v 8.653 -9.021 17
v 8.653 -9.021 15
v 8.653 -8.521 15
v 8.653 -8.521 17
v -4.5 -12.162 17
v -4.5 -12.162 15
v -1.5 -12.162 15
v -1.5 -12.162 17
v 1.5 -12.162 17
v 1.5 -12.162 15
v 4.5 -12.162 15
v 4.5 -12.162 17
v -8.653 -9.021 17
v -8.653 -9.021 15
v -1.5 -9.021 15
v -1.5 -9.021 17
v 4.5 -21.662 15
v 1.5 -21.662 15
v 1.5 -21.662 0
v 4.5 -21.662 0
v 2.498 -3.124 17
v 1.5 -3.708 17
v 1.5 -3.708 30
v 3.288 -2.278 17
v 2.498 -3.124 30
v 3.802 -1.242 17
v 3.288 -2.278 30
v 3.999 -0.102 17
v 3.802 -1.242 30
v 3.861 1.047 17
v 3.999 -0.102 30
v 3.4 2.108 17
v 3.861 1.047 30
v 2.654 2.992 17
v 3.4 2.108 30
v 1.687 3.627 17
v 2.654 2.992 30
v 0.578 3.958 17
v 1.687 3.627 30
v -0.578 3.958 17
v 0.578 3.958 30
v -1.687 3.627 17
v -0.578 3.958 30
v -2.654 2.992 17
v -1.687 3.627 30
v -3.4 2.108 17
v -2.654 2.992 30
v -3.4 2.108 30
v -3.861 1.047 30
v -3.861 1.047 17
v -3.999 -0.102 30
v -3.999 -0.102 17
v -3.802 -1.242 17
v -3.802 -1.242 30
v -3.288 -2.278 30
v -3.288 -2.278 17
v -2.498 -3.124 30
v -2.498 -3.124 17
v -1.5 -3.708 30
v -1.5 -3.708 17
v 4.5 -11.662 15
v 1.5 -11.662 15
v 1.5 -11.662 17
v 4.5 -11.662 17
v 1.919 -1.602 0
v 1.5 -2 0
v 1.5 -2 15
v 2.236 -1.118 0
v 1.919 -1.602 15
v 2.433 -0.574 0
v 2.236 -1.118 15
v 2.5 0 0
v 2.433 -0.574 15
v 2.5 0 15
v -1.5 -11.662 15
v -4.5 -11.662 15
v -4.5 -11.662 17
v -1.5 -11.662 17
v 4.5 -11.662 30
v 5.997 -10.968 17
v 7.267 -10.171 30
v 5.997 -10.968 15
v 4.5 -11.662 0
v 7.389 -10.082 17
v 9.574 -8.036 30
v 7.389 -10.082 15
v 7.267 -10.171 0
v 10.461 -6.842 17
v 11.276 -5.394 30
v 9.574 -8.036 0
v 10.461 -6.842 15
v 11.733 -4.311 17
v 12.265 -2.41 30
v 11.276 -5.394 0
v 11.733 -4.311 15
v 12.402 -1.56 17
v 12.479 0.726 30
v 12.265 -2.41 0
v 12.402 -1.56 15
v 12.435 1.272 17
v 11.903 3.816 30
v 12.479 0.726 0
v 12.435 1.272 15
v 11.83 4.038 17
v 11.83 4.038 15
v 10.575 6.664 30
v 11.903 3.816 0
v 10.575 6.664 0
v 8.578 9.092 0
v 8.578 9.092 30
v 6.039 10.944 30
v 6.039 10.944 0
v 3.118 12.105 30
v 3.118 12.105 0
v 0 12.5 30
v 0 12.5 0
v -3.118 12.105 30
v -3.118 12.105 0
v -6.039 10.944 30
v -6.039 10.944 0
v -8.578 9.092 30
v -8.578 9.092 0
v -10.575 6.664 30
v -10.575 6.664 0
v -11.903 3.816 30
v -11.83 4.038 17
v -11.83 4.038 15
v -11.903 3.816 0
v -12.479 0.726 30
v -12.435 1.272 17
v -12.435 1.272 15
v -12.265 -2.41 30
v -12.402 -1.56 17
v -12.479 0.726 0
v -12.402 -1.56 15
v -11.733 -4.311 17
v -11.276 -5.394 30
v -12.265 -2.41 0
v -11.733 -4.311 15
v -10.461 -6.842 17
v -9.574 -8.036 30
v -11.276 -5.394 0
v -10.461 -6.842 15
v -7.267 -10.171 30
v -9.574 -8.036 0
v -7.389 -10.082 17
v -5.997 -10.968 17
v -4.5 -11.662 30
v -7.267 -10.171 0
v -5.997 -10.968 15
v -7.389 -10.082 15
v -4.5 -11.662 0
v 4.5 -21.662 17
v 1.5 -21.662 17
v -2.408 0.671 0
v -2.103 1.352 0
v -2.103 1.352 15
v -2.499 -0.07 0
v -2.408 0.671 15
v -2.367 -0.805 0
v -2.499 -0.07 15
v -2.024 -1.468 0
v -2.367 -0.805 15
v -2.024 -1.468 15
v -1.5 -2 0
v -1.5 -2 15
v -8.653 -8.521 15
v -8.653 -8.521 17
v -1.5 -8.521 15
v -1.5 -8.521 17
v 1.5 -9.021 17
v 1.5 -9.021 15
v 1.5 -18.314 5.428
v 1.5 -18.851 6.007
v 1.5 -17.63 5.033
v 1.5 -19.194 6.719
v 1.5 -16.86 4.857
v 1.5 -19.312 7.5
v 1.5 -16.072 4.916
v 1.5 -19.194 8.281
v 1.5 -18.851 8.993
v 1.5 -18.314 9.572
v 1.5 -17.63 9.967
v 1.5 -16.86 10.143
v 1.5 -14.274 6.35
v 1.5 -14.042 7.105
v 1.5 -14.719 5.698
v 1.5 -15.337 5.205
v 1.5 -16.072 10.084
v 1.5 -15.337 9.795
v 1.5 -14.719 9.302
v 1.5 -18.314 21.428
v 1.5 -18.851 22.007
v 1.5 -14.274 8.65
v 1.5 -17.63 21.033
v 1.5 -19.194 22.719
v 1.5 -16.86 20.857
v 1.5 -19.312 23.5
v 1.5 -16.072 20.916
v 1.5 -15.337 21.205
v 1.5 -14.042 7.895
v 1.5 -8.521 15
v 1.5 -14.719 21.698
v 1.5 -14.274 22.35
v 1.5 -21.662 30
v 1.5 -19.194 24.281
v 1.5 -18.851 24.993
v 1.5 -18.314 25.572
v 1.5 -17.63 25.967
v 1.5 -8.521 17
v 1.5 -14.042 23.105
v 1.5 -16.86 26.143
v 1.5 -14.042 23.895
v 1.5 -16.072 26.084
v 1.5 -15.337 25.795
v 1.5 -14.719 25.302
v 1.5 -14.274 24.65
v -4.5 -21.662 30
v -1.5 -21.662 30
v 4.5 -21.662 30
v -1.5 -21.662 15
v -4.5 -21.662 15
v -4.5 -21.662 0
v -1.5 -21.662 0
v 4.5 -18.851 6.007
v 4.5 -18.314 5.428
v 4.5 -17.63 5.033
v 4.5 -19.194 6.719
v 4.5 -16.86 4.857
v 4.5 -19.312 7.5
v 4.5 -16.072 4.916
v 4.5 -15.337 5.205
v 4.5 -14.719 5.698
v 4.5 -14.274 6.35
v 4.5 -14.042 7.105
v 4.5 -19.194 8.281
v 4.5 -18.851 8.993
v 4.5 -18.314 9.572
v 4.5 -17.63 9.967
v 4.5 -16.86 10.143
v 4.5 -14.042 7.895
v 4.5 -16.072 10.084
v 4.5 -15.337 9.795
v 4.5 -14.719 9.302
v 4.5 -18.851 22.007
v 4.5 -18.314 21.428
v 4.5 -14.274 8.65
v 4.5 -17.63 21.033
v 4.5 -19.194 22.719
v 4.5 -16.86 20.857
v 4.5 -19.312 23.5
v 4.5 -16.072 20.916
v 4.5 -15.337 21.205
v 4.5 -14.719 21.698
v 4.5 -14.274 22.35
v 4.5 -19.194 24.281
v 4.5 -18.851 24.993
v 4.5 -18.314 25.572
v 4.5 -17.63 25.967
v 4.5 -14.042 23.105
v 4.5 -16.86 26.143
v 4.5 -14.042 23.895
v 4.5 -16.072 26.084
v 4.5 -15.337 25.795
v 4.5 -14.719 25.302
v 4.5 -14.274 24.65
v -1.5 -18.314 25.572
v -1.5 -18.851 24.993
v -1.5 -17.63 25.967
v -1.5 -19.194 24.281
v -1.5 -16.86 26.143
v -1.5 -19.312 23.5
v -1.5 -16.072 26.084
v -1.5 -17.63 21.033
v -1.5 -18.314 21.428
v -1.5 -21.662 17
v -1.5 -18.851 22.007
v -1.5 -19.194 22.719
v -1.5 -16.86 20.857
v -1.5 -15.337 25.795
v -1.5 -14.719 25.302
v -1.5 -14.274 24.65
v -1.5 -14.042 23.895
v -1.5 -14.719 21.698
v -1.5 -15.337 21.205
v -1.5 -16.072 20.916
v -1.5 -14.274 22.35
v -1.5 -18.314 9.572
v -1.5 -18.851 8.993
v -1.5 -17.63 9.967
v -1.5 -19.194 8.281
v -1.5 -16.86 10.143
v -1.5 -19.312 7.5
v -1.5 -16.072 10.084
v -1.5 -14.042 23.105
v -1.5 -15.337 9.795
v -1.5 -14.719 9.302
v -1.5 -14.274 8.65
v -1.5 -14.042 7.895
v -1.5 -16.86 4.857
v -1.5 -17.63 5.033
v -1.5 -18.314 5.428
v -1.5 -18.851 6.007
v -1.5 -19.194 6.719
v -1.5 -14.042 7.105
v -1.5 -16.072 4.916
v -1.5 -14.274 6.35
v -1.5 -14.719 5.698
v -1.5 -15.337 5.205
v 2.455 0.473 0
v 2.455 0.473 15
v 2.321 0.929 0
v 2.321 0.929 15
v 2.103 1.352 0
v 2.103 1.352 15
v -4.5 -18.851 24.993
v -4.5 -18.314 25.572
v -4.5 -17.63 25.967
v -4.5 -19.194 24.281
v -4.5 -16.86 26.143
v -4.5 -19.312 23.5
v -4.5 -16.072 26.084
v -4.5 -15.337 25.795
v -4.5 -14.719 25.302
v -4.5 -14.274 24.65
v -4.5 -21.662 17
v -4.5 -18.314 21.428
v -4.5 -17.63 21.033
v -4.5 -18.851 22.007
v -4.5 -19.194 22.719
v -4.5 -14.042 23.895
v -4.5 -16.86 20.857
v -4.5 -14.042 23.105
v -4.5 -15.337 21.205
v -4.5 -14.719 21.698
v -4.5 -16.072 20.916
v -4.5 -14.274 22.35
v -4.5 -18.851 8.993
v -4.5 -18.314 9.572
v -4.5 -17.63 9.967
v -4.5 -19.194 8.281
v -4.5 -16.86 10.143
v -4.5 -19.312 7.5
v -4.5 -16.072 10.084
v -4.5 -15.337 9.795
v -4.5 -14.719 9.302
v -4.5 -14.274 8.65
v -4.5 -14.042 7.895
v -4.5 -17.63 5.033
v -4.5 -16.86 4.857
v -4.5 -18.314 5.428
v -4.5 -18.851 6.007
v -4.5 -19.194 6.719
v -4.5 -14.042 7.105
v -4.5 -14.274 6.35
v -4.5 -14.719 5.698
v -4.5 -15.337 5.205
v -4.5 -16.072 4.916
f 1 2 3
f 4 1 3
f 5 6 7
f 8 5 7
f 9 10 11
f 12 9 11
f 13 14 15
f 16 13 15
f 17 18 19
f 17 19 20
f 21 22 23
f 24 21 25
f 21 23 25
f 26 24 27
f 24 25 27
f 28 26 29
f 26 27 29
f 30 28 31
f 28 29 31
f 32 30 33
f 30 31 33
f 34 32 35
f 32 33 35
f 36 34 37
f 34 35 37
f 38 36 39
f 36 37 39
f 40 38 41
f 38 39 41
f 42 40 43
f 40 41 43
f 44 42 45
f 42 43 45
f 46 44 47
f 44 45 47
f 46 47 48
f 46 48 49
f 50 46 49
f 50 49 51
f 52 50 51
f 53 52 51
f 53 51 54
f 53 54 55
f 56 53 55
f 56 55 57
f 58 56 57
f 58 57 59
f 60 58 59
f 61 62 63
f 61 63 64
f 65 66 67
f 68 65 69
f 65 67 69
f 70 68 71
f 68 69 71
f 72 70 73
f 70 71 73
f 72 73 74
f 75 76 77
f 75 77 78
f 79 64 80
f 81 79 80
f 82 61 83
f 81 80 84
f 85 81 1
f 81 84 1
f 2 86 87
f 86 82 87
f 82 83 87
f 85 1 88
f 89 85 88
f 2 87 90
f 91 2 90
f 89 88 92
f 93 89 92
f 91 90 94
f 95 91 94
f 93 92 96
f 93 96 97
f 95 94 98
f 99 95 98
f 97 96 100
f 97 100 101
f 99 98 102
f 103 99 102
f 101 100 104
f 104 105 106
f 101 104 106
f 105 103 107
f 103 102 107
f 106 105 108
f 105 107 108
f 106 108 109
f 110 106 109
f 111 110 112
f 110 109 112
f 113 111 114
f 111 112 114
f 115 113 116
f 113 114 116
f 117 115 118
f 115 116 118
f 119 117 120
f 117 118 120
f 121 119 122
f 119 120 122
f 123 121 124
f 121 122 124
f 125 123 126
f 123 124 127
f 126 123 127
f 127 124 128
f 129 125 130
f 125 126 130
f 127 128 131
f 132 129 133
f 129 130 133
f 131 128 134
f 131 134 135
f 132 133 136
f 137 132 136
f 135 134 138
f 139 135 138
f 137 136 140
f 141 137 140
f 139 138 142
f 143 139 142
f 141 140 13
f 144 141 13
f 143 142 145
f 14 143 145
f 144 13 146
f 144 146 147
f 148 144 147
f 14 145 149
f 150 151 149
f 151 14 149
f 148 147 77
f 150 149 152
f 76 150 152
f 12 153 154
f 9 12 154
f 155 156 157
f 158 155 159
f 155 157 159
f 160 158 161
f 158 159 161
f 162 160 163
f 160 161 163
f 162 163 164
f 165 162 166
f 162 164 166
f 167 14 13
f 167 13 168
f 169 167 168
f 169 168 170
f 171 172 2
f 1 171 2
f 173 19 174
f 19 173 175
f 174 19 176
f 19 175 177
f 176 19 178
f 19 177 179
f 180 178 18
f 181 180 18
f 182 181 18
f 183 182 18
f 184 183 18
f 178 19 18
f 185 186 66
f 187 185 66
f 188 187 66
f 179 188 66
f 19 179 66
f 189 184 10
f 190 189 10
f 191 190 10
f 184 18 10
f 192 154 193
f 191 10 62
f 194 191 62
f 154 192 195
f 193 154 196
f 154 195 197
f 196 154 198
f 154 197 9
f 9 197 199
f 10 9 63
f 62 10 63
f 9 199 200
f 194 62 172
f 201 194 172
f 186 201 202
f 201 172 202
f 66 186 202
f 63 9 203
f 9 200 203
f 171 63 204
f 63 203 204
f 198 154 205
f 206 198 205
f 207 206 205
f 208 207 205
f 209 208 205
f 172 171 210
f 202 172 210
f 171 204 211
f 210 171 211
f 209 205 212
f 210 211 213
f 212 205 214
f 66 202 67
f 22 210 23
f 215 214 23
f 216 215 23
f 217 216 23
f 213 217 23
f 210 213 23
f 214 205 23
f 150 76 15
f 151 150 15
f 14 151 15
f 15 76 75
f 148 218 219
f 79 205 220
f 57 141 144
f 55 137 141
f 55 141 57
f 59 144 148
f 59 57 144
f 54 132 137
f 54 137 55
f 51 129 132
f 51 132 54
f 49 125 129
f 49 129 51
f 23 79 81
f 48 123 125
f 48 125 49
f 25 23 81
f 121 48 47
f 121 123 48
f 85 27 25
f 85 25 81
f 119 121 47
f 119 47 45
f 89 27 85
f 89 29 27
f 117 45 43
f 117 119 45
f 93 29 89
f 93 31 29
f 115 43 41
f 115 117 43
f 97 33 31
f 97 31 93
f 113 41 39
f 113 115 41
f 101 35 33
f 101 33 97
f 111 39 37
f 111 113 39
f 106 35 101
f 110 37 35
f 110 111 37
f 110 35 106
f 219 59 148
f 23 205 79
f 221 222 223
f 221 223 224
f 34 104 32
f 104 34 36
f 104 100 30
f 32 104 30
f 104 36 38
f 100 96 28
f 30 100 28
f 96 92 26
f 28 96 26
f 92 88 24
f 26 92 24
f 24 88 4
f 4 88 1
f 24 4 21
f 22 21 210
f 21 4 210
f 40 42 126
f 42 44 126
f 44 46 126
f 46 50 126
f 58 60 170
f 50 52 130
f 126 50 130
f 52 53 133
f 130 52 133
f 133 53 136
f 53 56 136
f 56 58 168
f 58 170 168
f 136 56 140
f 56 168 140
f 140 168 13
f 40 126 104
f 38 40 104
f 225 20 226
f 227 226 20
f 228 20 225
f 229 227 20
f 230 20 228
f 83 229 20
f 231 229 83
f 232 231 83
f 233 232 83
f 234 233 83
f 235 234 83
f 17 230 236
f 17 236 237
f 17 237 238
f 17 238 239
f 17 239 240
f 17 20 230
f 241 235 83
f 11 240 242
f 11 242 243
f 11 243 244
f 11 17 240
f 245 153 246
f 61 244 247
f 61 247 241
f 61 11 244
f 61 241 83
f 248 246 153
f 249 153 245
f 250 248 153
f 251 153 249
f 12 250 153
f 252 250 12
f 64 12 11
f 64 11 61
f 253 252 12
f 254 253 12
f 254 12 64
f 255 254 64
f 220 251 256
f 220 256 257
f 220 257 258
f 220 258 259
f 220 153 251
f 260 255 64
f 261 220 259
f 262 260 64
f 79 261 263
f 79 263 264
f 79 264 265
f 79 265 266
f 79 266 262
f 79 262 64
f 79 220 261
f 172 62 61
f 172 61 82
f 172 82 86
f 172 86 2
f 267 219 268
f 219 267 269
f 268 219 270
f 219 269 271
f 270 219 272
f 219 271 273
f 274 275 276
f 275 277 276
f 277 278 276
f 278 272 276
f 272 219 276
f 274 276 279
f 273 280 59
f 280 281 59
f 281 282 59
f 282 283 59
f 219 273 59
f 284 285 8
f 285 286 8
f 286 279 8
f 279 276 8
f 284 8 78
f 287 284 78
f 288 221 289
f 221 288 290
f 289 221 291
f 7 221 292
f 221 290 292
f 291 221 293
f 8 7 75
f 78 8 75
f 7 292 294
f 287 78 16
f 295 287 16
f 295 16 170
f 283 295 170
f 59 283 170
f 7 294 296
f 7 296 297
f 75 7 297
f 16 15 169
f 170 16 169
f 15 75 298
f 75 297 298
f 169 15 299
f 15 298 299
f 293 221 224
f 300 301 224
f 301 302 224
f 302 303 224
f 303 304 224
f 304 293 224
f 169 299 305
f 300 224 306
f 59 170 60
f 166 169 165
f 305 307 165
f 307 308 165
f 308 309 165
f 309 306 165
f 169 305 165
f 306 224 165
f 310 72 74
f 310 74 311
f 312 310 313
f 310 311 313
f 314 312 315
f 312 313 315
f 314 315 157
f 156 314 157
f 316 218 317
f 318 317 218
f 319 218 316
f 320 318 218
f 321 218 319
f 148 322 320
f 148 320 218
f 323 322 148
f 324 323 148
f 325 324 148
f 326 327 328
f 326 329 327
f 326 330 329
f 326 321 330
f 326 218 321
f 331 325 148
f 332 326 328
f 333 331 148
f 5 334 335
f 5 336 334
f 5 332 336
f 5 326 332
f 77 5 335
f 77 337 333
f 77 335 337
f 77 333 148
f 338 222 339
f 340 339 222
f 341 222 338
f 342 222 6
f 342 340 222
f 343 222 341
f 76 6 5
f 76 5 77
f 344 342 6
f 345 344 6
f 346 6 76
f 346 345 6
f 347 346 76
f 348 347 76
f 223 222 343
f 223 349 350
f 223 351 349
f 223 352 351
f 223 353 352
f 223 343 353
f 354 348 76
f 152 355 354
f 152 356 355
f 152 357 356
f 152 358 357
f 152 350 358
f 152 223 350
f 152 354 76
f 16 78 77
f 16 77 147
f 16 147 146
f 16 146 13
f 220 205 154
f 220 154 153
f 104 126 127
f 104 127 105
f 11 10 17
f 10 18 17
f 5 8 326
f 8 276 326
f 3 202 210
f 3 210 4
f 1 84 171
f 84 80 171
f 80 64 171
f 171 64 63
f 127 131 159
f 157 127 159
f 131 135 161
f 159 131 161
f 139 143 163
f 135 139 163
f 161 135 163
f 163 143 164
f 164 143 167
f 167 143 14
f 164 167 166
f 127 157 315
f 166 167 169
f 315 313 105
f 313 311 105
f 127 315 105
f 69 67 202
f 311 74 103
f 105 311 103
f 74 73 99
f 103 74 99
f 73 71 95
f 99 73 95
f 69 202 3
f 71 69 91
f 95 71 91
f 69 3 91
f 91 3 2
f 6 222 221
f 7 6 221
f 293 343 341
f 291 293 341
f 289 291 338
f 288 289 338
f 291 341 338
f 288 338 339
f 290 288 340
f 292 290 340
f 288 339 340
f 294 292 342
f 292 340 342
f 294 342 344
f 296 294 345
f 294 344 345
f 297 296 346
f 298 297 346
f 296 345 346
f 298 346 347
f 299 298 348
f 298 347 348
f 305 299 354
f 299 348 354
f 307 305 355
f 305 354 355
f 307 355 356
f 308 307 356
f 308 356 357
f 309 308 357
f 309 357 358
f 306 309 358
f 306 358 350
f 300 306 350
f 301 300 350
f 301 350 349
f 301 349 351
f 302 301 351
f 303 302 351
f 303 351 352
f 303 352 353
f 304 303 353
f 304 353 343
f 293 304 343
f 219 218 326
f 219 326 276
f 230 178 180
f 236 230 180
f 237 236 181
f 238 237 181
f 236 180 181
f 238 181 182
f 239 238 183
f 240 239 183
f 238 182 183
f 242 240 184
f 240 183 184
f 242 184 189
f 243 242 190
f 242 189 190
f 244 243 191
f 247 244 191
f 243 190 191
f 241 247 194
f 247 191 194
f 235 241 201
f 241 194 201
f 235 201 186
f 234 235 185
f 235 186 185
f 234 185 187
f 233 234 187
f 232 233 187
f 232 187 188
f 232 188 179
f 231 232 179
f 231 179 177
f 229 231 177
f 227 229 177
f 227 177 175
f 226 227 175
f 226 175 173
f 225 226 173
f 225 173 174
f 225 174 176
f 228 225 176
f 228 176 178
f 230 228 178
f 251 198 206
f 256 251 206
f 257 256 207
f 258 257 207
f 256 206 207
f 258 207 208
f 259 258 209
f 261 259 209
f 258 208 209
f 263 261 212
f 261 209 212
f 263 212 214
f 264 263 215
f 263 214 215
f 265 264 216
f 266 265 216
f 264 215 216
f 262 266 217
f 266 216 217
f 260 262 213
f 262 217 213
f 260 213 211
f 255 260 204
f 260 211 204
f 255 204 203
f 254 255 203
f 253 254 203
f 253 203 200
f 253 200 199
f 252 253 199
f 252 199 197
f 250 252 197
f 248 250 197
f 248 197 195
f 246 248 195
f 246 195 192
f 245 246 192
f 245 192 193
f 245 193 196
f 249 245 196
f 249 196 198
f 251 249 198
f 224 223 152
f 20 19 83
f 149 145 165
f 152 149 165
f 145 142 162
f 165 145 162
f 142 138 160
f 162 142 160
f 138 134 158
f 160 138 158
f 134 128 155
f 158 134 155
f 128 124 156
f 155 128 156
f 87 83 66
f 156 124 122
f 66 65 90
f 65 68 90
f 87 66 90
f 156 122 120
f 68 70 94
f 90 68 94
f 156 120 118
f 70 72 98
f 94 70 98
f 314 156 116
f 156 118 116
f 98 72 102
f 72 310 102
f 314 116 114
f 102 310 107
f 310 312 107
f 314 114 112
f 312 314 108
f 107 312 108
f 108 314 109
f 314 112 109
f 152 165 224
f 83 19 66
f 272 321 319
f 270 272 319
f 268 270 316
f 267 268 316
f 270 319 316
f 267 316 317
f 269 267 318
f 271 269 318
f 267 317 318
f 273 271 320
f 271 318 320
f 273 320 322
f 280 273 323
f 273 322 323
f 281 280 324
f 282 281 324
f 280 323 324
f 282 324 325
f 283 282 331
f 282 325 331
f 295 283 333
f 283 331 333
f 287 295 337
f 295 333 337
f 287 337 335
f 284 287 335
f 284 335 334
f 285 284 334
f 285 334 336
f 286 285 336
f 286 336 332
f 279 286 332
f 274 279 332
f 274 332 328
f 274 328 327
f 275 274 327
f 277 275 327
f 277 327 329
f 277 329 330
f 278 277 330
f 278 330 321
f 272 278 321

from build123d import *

# Parameters (mm, degrees)
F0_R      = 12.5
F1_DEPTH  = 30
F3_DEPTH  = 30.001
F4_R      = 4
F5_DEPTH  = 15
F6_W      = 3
F6_H      = 12.5
F7_DEPTH  = 30.001
F9_DEPTH  = 30
F10_W     = 20.1029244214
F10_H     = 2
F10_W_2   = 3
F10_W_3   = 20.1884878725
F11_DEPTH = 25.7
F12_R     = 2.65
F13_DEPTH = 17.001
F14_W     = 3
F14_H     = 0.5
F15_DEPTH = 2
F16_W     = 7.1528945421
F16_H     = 0.5
F17_DEPTH = 2


with BuildPart() as f1:
    # F0 (on Top) → F1 (new body)
    with BuildSketch(Plane.XY):
        Circle(F0_R)
    extrude(amount=F1_DEPTH)

    # F2 (on face) → F3 (cut, through all)
    with BuildSketch(Plane.XY.offset(30)):
        with BuildLine():
            ThreePointArc((-2.1028398647, 1.3520593565), (-0.7045922006, -2.3986558383), (2.5, 0))
            ThreePointArc((2.5, 0), (2.3986558383, 0.7045922006), (2.1028398647, 1.3520593565))
            Line((2.1028398647, 1.3520593565), (-2.1028398647, 1.3520593565))
        make_face()
    extrude(amount=-F3_DEPTH, mode=Mode.SUBTRACT)

    # F4 (on face) → F5 (cut)
    with BuildSketch(Plane.XY.offset(30)):
        Circle(F4_R)
        with BuildLine():
            ThreePointArc((2.1028398647, 1.3520593565), (2.3986558383, 0.7045922006), (2.5, 0))
            ThreePointArc((2.5, 0), (-0.7045922006, -2.3986558383), (-2.1028398647, 1.3520593565))
            Line((-2.1028398647, 1.3520593565), (2.1028398647, 1.3520593565))
        make_face(mode=Mode.SUBTRACT)
    extrude(amount=-F5_DEPTH, mode=Mode.SUBTRACT)

    # F6 (on face) → F7 (cut, through all)
    with BuildSketch(Plane.XY.offset(30)):
        with Locations((0, -6.25)):
            Rectangle(F6_W, F6_H)
    extrude(amount=-F7_DEPTH, mode=Mode.SUBTRACT)

    # F8 (on face) → F9 (join, through all)
    with BuildSketch(Plane.XY.offset(30)):
        with BuildLine():
            Line((-4.5, -21.6619037897), (-1.5, -21.6619037897))
            Line((-1.5, -21.6619037897), (-1.5, -12.409673646))
            ThreePointArc((-1.5, -12.409673646), (-3.0232085504, -12.1288997877), (-4.5, -11.6619037897))
            Line((-4.5, -11.6619037897), (-4.5, -21.6619037897))
        make_face()
        with BuildLine():
            Line((4.5, -21.6619037897), (4.5, -11.6619037897))
            ThreePointArc((4.5, -11.6619037897), (3.0232085504, -12.1288997877), (1.5, -12.409673646))
            Line((1.5, -12.409673646), (1.5, -21.6619037897))
            Line((1.5, -21.6619037897), (4.5, -21.6619037897))
        make_face()
    extrude(amount=-F9_DEPTH)

    # F10 (on face) → F11 (cut, symmetric)
    with BuildSketch(Plane.XZ.offset(21.6619037897)):
        with Locations((-8.5514622107, 16)):
            Rectangle(F10_W, F10_H)
        with Locations((3, 16)):
            Rectangle(F10_W_2, F10_H)
        with Locations((14.5942439362, 16)):
            Rectangle(F10_W_3, F10_H)
    extrude(amount=F11_DEPTH, both=True, mode=Mode.SUBTRACT)

    # F12 (on face) → F13 (cut, through all)
    with BuildSketch(Plane(origin=(-4.5, 0, 0), x_dir=(0, -1, 0), z_dir=(-1, 0, 0))):
        with Locations((16.6619037897, 23.5)):
            Circle(F12_R)
        with Locations((16.6619037897, 7.5)):
            Circle(F12_R)
    extrude(amount=-F13_DEPTH, mode=Mode.SUBTRACT)

    # F14 (on face) → F15 (join, through all)
    with BuildSketch(Plane.XY.offset(15)):
        with Locations((-3, -11.9119037897)):
            Rectangle(F14_W, F14_H)
        with Locations((3, -11.9119037897)):
            Rectangle(F14_W, F14_H)
    extrude(amount=F15_DEPTH)

    # F16 (on face) → F17 (join, through all)
    with BuildSketch(Plane.XY.offset(15)):
        with Locations((5.0764472711, -8.7709431903)):
            Rectangle(F16_W, F16_H)
        with Locations((-5.0764472711, -8.7709431903)):
            Rectangle(F16_W, F16_H)
    extrude(amount=F17_DEPTH)


solid = f1.part
